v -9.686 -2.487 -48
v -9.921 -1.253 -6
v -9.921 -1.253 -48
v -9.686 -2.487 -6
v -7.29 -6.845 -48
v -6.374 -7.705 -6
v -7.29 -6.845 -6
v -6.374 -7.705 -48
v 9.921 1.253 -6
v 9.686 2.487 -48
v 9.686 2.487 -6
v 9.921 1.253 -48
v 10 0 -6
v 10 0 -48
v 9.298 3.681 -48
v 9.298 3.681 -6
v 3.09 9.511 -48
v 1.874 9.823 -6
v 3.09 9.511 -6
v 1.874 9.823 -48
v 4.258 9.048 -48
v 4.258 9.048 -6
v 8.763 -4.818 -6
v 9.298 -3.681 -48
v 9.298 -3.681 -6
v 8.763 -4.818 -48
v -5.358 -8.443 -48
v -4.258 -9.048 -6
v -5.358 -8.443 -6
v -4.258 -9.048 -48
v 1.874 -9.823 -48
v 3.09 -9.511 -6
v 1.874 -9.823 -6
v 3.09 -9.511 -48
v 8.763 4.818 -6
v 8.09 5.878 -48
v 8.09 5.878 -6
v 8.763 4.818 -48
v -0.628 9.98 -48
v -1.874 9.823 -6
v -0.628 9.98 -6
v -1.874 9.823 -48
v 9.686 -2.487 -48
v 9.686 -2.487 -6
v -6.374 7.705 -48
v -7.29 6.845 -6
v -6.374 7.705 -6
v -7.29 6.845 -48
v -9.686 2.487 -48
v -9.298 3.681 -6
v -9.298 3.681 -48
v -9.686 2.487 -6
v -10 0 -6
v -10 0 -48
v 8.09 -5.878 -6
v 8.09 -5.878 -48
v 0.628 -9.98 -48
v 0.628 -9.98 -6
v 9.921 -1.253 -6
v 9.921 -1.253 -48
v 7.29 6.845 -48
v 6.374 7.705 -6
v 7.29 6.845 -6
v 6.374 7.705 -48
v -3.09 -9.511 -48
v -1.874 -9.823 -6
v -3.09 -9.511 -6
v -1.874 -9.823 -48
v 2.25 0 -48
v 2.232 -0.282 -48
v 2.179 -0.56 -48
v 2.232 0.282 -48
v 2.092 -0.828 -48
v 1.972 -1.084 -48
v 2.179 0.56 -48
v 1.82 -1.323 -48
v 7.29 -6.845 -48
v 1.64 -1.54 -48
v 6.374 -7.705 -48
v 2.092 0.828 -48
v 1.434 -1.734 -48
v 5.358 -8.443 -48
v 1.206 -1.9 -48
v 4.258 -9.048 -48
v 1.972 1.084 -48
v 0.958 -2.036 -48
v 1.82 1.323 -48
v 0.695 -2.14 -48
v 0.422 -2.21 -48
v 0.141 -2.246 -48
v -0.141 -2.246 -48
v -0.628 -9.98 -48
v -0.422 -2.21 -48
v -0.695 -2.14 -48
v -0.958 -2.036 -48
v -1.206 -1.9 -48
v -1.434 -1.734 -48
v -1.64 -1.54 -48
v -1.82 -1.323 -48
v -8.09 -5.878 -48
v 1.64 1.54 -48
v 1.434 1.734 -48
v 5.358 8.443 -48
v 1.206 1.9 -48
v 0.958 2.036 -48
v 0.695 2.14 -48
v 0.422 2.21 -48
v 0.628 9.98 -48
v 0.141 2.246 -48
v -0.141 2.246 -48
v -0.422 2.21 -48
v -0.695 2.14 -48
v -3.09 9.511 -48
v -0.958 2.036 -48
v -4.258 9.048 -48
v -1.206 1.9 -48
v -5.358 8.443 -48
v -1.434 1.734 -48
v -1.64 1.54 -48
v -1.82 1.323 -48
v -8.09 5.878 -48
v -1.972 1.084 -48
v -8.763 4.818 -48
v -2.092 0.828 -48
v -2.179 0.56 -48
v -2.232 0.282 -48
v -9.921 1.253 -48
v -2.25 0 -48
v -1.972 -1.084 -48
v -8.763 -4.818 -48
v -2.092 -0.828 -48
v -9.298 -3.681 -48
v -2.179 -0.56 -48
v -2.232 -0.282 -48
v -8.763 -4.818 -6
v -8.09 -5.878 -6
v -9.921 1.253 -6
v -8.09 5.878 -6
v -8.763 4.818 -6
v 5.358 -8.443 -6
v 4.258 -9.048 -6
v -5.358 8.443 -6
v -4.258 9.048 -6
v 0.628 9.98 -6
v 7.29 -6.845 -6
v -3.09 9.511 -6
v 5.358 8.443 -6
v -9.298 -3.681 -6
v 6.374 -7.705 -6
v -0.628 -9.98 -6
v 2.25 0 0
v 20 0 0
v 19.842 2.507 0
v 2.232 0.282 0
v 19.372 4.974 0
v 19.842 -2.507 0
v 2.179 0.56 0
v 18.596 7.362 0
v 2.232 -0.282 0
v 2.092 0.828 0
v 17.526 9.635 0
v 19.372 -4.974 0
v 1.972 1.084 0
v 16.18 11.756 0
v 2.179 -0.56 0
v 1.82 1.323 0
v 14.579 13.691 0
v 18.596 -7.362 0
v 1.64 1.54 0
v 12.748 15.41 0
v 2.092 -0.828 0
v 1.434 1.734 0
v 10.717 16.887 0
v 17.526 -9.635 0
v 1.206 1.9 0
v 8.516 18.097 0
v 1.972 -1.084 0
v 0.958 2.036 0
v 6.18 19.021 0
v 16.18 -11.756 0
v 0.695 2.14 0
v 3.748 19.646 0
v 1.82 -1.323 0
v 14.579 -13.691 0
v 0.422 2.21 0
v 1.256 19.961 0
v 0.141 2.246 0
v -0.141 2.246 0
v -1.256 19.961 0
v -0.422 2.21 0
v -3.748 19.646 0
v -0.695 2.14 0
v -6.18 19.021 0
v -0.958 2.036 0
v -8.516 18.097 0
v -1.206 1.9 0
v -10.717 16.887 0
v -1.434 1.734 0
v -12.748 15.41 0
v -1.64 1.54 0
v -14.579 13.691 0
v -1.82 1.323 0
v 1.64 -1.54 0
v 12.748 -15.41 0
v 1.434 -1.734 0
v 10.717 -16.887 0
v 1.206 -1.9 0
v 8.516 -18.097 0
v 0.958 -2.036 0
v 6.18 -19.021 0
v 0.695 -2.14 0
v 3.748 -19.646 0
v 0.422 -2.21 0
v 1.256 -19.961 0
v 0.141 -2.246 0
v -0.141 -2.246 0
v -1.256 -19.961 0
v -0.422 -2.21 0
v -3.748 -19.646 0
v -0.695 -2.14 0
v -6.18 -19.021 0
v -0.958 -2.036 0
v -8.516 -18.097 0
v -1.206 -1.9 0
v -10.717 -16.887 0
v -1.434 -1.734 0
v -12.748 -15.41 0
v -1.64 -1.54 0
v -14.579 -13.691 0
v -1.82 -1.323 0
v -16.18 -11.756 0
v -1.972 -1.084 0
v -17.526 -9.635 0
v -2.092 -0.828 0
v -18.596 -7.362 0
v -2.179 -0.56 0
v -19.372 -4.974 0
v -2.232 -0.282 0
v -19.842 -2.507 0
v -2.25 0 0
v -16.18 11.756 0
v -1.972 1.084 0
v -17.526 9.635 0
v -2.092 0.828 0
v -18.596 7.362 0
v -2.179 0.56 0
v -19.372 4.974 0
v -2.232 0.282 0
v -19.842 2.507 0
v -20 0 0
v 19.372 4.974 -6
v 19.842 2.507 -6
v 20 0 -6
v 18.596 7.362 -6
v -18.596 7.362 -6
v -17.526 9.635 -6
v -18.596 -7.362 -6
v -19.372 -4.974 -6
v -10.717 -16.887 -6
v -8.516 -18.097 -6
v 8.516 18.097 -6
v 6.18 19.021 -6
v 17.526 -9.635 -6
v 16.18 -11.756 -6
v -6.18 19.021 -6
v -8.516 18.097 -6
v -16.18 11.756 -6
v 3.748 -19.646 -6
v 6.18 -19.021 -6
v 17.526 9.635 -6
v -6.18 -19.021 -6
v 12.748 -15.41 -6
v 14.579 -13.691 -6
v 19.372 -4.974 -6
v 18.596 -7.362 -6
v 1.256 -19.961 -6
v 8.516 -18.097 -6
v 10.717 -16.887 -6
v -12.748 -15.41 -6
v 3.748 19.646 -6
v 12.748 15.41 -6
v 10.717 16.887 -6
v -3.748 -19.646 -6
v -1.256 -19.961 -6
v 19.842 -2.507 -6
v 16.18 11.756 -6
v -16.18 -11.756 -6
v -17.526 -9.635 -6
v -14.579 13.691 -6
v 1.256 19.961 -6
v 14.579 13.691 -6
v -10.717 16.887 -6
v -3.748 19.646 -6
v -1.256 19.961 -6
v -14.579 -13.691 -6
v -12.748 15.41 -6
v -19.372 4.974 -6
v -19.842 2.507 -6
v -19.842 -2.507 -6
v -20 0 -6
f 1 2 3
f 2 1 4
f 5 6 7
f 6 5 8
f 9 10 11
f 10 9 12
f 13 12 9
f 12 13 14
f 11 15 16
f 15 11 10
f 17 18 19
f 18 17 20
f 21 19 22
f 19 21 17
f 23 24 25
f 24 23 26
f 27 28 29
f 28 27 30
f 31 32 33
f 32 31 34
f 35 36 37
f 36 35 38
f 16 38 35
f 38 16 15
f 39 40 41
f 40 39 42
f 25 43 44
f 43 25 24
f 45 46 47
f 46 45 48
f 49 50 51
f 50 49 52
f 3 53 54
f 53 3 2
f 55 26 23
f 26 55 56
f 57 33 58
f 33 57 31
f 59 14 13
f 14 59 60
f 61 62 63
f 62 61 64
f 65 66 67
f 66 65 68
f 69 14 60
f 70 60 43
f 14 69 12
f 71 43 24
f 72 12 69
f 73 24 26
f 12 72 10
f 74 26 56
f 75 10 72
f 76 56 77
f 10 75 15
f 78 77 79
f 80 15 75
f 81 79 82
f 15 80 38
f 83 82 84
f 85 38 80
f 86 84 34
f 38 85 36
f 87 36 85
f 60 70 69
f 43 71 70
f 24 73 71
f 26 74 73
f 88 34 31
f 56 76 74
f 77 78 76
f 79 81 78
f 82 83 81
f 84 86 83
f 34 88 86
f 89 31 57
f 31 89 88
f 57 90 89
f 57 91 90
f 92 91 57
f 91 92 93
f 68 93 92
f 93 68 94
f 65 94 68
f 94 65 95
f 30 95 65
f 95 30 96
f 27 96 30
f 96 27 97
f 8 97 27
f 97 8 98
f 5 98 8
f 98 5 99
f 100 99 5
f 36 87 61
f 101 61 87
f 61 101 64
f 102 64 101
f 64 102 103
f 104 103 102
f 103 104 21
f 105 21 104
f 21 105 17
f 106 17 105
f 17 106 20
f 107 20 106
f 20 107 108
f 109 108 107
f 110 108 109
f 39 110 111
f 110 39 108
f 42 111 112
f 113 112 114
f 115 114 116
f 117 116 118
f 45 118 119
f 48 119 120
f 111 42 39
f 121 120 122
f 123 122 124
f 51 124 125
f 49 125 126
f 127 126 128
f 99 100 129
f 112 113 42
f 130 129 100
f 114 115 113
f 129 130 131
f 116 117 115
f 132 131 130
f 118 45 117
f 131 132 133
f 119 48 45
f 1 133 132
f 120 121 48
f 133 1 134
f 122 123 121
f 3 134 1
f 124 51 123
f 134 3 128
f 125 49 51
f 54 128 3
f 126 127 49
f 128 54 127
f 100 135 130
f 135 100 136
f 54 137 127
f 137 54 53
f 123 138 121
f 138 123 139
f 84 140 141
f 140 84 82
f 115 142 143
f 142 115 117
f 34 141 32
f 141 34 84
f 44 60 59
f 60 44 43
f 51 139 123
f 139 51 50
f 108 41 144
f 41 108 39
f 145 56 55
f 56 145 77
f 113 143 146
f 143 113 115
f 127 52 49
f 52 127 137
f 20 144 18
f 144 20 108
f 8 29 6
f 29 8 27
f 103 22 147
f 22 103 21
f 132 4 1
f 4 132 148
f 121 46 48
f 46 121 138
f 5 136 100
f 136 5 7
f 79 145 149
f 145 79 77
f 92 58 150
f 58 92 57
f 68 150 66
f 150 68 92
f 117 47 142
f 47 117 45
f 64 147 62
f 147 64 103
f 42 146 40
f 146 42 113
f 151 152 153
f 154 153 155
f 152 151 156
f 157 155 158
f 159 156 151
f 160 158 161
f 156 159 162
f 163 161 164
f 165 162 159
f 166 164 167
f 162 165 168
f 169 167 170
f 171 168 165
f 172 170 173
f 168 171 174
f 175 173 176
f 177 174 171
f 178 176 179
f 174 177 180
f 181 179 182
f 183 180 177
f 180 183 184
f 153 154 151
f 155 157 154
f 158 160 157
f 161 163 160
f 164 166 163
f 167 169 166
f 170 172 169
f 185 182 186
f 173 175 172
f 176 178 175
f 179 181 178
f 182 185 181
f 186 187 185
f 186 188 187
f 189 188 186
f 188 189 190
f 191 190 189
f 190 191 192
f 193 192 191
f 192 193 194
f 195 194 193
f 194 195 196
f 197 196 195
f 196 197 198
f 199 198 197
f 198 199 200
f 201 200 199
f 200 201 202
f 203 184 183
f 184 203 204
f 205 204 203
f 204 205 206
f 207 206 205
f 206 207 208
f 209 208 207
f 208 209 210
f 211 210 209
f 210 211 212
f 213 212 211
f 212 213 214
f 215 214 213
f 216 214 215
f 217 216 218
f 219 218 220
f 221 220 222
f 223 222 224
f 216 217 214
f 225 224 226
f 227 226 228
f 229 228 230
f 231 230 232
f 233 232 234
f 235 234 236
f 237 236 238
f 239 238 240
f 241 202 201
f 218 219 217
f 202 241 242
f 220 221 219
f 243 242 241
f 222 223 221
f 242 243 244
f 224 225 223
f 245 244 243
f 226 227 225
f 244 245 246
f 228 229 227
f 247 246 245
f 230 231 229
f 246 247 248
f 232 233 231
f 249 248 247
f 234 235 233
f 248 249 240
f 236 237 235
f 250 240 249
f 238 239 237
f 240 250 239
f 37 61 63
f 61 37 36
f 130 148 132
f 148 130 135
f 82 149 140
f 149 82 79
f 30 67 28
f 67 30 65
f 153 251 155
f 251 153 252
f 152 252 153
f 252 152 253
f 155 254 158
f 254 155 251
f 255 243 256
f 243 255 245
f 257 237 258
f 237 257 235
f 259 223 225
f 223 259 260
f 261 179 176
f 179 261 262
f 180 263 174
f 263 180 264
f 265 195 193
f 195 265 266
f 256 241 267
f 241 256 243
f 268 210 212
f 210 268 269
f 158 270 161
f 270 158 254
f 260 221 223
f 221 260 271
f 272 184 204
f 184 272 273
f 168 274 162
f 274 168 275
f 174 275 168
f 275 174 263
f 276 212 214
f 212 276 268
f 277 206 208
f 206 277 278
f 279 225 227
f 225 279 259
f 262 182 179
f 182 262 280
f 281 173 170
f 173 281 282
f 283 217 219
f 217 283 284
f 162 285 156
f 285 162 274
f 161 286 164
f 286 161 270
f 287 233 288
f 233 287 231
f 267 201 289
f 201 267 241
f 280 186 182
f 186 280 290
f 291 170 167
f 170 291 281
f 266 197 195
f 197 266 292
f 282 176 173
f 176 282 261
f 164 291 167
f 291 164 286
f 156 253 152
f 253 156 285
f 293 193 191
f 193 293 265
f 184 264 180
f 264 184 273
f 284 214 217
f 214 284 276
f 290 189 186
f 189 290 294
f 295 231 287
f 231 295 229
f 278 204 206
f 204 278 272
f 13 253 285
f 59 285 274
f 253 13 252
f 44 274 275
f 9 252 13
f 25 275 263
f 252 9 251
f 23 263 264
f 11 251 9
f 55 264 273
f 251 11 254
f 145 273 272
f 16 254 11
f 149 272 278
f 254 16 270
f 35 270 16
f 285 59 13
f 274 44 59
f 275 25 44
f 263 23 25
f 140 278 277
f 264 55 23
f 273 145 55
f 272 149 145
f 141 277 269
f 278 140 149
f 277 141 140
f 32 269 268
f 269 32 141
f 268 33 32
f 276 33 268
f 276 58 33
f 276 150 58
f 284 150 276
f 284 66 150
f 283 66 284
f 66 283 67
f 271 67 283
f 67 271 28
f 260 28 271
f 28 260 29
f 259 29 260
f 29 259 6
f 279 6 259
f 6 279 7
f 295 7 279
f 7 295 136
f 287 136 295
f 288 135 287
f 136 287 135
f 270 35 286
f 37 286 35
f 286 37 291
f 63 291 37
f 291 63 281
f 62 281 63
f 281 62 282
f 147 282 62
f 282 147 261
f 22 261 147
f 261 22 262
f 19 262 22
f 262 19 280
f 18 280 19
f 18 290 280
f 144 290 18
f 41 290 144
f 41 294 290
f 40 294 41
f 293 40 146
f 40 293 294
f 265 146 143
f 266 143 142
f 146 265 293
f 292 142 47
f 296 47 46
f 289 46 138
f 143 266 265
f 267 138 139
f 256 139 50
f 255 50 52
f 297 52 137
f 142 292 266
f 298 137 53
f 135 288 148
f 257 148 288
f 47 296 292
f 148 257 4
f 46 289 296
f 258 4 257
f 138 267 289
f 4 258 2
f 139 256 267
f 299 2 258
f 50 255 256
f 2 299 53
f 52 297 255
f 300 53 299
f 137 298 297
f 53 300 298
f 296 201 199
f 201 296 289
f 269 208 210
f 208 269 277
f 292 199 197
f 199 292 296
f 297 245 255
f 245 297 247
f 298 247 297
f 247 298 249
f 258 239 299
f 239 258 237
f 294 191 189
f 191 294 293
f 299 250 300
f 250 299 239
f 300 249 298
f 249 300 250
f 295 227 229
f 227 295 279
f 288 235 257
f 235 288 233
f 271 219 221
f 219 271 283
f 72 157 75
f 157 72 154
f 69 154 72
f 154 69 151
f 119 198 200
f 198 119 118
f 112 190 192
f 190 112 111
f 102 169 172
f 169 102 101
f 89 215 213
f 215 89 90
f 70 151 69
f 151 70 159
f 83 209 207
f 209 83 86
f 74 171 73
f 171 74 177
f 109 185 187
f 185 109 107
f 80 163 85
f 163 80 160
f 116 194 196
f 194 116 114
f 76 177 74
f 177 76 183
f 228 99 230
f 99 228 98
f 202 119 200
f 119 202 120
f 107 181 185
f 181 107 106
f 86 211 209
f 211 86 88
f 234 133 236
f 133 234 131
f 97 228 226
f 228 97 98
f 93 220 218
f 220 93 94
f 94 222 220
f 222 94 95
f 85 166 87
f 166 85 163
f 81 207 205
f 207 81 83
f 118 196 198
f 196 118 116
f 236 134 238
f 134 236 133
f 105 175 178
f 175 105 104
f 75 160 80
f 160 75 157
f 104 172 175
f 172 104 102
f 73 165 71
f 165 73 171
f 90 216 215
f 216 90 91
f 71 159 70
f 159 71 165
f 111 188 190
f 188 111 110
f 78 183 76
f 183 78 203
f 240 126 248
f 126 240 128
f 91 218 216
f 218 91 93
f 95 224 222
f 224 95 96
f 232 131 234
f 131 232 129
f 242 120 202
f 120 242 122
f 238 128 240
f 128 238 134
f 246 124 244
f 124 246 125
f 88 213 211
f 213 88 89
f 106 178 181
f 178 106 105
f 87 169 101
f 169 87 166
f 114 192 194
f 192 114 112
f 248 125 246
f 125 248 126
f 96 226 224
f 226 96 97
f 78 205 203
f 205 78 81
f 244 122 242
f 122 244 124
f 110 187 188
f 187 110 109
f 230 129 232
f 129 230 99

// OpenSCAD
$fn = 50;


difference() {
	union() {
		translate(v = [0, 0, -48.0000000000]) {
			cylinder(h = 48, r = 10.0000000000);
		}
		translate(v = [0, 0, -6.0000000000]) {
			cylinder(h = 6, r = 20.0000000000);
		}
	}
	union() {
		#translate(v = [0, 0, -48]) {
			cylinder(h = 48, r = 2.2500000000);
		}
	}
}
